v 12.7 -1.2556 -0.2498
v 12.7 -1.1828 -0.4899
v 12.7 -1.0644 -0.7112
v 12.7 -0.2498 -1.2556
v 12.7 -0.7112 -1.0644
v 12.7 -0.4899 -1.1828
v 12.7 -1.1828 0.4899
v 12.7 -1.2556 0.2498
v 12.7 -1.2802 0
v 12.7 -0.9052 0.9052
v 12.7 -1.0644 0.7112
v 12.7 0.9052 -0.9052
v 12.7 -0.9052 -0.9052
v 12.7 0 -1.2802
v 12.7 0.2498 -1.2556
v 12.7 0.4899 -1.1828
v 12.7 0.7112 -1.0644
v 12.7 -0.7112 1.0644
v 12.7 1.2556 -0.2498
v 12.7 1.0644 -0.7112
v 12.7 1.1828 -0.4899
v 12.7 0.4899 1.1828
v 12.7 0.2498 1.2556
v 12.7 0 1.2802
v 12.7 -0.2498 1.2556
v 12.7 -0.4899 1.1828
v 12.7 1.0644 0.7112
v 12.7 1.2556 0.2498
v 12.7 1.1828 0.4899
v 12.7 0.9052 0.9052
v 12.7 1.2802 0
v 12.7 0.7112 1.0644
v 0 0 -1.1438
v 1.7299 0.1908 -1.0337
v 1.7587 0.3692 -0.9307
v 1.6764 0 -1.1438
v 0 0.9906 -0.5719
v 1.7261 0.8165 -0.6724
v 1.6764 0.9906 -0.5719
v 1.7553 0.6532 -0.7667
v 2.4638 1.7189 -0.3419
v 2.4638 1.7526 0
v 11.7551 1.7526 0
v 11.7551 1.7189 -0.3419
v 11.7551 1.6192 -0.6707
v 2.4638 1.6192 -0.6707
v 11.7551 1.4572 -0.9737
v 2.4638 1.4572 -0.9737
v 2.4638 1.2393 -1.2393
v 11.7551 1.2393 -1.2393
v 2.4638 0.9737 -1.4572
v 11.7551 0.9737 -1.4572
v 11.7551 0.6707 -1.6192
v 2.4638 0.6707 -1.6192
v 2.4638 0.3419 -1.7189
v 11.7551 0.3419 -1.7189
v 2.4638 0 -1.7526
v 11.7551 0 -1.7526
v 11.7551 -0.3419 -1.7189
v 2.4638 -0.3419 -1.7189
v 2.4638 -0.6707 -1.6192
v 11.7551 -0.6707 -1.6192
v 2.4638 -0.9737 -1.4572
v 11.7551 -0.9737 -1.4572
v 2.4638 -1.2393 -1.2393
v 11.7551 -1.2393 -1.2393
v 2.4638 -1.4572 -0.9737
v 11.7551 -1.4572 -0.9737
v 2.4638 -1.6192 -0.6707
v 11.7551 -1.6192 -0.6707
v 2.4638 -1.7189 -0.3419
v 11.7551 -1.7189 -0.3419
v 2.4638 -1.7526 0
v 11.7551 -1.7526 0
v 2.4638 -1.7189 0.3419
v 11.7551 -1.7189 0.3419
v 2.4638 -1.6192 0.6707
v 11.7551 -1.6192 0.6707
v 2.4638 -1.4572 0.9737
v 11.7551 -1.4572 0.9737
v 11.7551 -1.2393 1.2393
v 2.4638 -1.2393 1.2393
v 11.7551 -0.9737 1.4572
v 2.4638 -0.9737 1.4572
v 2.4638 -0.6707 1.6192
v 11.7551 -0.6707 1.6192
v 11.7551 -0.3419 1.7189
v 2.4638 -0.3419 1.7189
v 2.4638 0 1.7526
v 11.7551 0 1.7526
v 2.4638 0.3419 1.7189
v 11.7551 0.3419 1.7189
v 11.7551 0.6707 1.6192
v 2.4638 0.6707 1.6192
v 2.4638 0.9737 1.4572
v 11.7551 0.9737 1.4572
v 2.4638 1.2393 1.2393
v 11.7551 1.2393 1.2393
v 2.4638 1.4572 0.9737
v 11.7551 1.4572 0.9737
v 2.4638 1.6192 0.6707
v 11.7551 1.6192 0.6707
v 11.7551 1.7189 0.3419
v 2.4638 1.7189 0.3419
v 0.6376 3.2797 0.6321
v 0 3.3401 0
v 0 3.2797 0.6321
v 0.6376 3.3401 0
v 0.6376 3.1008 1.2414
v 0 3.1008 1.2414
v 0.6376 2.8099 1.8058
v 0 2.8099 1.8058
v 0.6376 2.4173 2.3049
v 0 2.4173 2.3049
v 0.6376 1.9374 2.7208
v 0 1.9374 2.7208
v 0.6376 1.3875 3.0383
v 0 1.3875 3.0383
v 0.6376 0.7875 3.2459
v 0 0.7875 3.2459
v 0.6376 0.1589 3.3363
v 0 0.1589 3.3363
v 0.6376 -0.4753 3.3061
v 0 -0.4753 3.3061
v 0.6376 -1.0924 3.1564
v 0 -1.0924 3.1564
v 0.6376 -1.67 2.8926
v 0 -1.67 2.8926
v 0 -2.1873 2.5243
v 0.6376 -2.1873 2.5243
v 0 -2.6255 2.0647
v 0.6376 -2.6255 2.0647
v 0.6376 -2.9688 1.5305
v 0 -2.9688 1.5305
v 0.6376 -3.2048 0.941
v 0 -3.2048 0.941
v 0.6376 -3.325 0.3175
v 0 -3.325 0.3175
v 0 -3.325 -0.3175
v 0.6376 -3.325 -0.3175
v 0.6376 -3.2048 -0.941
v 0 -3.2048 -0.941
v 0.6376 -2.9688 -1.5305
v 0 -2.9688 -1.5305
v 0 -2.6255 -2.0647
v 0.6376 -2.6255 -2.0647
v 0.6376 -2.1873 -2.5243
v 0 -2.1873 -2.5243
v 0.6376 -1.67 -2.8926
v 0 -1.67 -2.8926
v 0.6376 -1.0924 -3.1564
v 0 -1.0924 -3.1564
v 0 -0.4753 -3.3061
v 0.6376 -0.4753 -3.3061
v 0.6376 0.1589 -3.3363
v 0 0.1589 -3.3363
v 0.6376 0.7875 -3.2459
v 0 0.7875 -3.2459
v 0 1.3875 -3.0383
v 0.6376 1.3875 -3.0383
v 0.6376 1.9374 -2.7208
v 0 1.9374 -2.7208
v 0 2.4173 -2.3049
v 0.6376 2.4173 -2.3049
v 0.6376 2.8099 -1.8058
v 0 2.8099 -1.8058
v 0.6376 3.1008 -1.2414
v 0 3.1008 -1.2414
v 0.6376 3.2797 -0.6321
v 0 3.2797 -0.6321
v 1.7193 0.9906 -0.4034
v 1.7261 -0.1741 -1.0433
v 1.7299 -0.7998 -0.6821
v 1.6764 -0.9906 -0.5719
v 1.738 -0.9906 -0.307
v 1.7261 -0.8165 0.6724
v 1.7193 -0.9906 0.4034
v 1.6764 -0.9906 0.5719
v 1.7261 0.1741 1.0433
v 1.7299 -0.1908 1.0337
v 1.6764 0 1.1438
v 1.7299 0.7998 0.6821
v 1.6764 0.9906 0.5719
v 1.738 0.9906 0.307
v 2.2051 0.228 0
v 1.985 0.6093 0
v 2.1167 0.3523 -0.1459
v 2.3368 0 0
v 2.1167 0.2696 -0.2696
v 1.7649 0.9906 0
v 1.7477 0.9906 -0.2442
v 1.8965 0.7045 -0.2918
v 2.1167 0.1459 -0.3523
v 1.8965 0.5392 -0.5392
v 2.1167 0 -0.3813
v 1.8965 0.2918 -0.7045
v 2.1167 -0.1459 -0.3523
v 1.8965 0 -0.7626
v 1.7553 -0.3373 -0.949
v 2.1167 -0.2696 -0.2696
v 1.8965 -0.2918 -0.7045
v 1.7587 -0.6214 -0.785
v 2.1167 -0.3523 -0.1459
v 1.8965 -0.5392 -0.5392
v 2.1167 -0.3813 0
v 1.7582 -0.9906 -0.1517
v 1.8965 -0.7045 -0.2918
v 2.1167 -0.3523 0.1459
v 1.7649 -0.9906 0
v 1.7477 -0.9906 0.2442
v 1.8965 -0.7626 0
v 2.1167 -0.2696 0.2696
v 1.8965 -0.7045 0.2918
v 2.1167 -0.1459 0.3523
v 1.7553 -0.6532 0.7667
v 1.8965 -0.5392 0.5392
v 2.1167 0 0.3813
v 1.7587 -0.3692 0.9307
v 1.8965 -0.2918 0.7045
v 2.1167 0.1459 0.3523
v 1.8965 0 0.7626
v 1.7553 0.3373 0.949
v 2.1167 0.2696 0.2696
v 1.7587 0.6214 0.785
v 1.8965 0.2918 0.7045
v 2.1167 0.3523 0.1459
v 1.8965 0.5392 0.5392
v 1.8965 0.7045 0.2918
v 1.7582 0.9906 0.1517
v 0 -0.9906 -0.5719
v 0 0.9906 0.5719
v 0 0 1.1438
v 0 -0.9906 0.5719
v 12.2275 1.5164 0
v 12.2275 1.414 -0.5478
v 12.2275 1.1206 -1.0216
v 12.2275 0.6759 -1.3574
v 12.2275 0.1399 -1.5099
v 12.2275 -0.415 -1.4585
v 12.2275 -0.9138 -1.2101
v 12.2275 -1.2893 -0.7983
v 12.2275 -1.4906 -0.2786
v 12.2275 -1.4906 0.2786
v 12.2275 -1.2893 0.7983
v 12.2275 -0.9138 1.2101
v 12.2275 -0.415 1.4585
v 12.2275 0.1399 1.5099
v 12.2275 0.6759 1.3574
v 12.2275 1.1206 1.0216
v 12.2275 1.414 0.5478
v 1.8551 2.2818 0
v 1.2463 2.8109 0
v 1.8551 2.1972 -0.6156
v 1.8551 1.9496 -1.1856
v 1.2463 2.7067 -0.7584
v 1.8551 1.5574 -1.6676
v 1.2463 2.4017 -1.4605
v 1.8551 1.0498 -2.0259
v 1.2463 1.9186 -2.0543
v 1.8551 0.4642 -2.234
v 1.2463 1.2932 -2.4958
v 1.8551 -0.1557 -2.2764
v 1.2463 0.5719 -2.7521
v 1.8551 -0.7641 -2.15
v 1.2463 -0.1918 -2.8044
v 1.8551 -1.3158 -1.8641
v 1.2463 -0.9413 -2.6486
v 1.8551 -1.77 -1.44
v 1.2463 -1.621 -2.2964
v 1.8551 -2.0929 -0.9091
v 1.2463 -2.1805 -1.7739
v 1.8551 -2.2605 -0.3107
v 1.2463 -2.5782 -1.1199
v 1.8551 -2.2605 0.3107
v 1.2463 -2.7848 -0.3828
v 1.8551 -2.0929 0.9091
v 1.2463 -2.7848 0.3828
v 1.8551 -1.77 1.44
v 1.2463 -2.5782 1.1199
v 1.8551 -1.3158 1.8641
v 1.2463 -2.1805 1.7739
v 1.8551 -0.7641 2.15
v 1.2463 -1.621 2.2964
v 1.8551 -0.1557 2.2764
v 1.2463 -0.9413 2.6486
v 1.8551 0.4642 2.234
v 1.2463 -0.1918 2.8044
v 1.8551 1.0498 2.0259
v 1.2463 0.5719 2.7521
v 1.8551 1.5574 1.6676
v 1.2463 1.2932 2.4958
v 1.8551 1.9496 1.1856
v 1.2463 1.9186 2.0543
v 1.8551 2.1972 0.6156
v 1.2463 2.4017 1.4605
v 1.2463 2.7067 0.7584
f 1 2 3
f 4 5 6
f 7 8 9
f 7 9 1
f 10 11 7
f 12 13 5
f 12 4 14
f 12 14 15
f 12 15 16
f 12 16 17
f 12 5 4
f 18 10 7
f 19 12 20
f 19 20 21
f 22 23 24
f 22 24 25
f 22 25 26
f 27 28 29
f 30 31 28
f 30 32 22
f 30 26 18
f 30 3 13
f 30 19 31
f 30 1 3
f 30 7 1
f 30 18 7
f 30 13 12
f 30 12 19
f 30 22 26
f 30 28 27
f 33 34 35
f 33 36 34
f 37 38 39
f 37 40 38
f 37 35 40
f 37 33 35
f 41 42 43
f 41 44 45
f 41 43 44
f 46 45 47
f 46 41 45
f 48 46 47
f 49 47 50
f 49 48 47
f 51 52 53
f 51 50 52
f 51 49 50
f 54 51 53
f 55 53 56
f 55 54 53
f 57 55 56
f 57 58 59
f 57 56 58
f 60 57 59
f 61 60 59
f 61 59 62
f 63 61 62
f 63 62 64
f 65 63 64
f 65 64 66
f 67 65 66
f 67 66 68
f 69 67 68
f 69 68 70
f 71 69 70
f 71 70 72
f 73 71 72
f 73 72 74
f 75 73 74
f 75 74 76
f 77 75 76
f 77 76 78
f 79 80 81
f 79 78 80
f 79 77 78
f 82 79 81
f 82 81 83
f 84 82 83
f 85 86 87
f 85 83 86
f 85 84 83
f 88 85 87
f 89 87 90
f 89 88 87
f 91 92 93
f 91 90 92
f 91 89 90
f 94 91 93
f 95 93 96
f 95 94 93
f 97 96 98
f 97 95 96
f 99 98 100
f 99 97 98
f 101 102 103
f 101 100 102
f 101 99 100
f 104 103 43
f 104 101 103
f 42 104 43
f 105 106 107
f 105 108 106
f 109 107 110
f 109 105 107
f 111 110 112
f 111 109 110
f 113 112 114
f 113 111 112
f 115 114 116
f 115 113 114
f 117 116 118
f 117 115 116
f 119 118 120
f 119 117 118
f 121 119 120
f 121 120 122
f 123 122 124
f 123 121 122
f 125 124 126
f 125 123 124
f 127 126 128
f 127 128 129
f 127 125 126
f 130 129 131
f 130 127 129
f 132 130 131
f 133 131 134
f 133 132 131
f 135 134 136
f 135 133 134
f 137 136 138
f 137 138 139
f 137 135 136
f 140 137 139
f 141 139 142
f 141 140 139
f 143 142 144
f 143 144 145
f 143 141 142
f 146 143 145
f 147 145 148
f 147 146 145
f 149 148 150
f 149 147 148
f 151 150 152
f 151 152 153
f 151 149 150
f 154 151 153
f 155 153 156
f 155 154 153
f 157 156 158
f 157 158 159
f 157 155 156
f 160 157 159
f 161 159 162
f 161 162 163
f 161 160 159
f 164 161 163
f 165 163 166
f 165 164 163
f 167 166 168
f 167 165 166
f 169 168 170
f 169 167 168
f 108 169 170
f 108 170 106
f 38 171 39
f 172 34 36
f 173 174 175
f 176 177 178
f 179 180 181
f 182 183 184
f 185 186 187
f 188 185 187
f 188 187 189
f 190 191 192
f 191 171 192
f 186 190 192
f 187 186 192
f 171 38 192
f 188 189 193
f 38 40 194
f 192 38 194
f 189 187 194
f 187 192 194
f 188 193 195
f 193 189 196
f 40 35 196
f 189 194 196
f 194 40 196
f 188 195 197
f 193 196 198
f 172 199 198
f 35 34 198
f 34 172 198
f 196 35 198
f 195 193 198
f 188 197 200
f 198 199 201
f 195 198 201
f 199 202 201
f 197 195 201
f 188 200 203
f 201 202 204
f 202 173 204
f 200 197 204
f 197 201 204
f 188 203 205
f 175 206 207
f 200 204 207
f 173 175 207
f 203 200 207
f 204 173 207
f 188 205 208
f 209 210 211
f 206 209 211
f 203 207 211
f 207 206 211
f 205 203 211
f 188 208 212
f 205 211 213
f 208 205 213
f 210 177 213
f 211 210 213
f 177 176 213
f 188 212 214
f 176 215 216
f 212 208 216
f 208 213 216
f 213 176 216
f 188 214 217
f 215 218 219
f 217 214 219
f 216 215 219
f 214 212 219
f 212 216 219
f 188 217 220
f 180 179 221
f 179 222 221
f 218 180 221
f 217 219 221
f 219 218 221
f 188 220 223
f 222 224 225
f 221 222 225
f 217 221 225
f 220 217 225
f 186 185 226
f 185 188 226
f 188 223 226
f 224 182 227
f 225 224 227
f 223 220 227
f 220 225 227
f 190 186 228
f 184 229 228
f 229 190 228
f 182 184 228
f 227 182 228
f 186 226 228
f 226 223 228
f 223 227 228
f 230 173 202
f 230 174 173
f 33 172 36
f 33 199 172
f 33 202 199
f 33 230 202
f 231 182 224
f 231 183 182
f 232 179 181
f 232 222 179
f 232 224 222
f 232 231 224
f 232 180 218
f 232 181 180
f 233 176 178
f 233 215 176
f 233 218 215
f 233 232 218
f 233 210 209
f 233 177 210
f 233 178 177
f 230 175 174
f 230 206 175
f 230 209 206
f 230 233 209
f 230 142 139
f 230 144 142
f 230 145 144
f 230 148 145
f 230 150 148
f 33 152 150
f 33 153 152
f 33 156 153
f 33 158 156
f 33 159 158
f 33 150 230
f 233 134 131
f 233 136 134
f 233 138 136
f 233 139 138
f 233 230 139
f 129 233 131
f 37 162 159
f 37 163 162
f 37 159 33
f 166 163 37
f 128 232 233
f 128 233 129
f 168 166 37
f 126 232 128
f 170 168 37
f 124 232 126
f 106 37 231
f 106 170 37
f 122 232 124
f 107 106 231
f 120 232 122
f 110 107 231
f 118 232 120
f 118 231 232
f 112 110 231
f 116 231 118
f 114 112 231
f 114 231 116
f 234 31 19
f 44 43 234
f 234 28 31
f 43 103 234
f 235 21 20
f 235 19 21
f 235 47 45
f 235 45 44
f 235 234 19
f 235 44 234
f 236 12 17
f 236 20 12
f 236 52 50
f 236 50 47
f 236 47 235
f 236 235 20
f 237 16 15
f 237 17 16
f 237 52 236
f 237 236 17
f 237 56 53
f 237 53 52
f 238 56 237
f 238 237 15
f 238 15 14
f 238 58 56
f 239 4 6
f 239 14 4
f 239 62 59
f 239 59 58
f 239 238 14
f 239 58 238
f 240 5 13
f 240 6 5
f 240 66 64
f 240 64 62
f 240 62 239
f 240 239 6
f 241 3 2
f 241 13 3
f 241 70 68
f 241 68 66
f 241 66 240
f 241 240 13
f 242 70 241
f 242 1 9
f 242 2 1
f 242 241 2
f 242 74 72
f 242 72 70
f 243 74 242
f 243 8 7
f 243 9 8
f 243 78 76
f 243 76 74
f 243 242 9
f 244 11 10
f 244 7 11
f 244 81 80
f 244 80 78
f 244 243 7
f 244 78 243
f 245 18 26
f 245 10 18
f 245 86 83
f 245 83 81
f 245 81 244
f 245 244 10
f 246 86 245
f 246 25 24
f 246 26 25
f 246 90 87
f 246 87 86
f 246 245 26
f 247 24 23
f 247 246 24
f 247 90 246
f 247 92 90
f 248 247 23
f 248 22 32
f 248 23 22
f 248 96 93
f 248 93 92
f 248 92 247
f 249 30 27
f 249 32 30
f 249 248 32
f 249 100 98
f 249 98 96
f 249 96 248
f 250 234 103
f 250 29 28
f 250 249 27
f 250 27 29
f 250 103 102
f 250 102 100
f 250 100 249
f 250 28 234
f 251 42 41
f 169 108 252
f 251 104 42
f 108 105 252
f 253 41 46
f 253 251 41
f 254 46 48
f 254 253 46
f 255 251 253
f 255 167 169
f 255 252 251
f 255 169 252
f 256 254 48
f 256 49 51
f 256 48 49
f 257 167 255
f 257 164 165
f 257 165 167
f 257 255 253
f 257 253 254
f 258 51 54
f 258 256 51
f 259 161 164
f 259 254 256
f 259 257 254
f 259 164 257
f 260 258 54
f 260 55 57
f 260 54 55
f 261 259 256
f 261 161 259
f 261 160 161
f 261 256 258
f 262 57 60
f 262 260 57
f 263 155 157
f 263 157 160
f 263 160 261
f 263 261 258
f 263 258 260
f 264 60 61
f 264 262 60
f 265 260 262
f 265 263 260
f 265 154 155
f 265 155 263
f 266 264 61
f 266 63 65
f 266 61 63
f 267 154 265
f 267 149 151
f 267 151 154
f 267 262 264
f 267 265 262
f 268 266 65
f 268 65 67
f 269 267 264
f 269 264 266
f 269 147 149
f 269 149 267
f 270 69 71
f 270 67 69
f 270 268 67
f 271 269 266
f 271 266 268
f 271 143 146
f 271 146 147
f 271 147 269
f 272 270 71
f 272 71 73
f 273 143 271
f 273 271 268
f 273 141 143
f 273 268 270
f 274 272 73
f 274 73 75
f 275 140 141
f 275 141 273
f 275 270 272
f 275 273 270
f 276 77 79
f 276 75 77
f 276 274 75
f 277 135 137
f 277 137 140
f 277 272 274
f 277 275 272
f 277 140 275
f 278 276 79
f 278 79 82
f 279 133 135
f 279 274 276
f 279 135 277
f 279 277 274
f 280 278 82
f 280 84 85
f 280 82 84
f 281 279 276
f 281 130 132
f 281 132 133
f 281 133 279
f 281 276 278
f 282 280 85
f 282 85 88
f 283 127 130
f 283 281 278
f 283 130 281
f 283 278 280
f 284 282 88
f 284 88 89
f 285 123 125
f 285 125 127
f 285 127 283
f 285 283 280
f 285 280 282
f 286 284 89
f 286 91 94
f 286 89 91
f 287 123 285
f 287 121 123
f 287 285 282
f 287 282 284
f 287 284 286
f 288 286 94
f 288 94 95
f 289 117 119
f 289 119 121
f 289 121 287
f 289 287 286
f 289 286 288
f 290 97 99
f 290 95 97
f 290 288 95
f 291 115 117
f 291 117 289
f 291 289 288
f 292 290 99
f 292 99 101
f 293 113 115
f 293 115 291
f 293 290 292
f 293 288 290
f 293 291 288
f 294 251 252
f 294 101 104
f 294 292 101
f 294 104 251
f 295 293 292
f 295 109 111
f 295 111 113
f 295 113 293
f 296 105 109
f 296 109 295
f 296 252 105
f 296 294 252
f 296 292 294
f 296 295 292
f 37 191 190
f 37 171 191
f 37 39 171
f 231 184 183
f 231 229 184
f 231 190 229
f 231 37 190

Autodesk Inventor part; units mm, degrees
ref_plane "YZ Plane" through (0, 0, 0) normal (1, 0, 0) x (0, 1, 0)
ref_plane "XZ Plane" through (0, 0, 0) normal (0, 1, 0) x (-1, 0, 0)
sketch "Sketch1" plane through (0, 0, 0) normal (0, 0, 1) x (1, 0, 0)
  line L0 (12.7, 0) -> (12.7, 1.7526)
  line L1 (12.7, 1.7526) -> (4.4483, 1.7526)
  line L2 (4.4483, 1.7526) -> (2.4638, 1.7526)
  line L3 (0, 3.3401) -> (0, 1.1438)
  line L4 (0, 1.1438) -> (1.6764, 1.1438)
  line L5 (1.6764, 1.1438) -> (2.3368, 0)
  line L6 (2.3368, 0) -> (12.7, 0)
  line L7 (0, 3.3401) -> (0.6376, 3.3401)
  line L8 (0.6376, 3.3401) -> (2.4638, 1.7526)
  line L9 (2.4638, 1.7526) -> (2.4638, 1.7526)
  line L10 (4.4483, 1.7526) -> (2.4638, 1.7526) construction
  line L11 (2.4638, 1.7526) -> (2.4638, 1.7526)
  line L12 (-2.54, 0) -> (15.24, 0) projected
  line L13 (0, -0.668) -> (0, 4.0081) projected
  dimension "d0" = 12.7
  dimension "d1" = 8.2517
  dimension "d2" = 1.6764
  dimension "d3" = 3.5052
  dimension "d6" = 2.4638
  dimension "d7" = 41
  dimension "d8" = 2.2877
  dimension "d9" = 60
  dimension "d10" = 6.6802
  dimension "d11" = 3.5052
  dimension "d12" = 1.9845
revolve "Body" add sketch "Sketch1" angle 360 about axis through (2.3368, 0, 0) along (1, 0, 0) contours L6 L5 L4 L3 L7 L8 L2 L1 L0
sketch "Sketch2" plane through (0, 0, 0) normal (-1, 0, 0) x (0, 0, 1)
  circle A0 centre (0, 0) radius 1.1438 projected
  line L0 (0, -4.6761) -> (0, 4.6761) projected
  line L1 (-4.6761, 0) -> (4.6761, 0) projected
  line L2 (1.1438, 0) -> (0.5719, -0.9906)
  line L3 (0.5719, -0.9906) -> (-0.5719, -0.9906)
  line L4 (-0.5719, -0.9906) -> (-1.1438, 0)
  line L5 (-1.1438, 0) -> (-0.5719, 0.9906)
  line L6 (-0.5719, 0.9906) -> (0.5719, 0.9906)
  line L7 (0.5719, 0.9906) -> (1.1438, 0)
  point P0 (0, 1.1438)
extrude "Slot" add sketch "Sketch2" against normal up to next contours L7 A0 | A0 L2 | L6 L0 A0 | A0 L0 L3 | L0 L6 A0 | A0 L3 L0 | L4 A0 | A0 L5
thread "Thread" size "6-32 UNC" class "2A" standard "ANSI Unified Screw Threads" length 8.2517
chamfer "Chamfer1" distance 0.4724 distance2 0.9449 1 edges at (12.7, -1.7526, 0) measured on face at (12.7, 0.5842, 0.7748)
ref_plane "Work Plane1" through (104.775, 0, 0) normal (0, 0, -1) x (1, 0, 0)
equation "\"d15\" = GEL"
equation "\"d17\" = -0.5 * SPD + 0.5 * GD"
equation "\"d18\" = GUL"
equation "\"d0\" = NLG"
equation "\"d1\" = GEL"
equation "\"d2\" = INTI"
equation "\"d3\" = GD"
equation "\"d6\" = KOH"
equation "\"d7\" = 0.5 * SEWI"
equation "\"d8\" = 1.1547 * SW"
equation "\"d10\" = KOD"
equation "\"d11\" = BDM"
equation "\"d12\" = GAL"
equation "\"NLG\" = 12.7"
equation "\"INTI\" = 1.6764"
equation "\"GEL\" = 8.2517"
equation "\"GAL\" = 1.9845"
equation "\"KOH\" = 2.4638"
equation "\"KOD\" = 6.6802"
equation "\"GUL\" = 0.94488"
equation "\"SPD\" = 2.56032"
equation "\"BDM\" = NND"
equation "\"GD\" = NND"
equation "\"SEWI\" = 82deg"
equation "\"SW\" = 1.9812"
equation "\"TOA\" = 30deg"
equation "\"GD1\" = SPD"
equation "\"THREADDIA\" = 3.5052"
equation "\"HHPTC\" = 0.79375"
equation "\"NND\" = 3.5052"
equation "\"E0\" = 1.155 * SW"
properties part number "ANSI B18.3 - 6-32 UNC x 0.5, HSFCHCSI" material "Steel, Mild"
